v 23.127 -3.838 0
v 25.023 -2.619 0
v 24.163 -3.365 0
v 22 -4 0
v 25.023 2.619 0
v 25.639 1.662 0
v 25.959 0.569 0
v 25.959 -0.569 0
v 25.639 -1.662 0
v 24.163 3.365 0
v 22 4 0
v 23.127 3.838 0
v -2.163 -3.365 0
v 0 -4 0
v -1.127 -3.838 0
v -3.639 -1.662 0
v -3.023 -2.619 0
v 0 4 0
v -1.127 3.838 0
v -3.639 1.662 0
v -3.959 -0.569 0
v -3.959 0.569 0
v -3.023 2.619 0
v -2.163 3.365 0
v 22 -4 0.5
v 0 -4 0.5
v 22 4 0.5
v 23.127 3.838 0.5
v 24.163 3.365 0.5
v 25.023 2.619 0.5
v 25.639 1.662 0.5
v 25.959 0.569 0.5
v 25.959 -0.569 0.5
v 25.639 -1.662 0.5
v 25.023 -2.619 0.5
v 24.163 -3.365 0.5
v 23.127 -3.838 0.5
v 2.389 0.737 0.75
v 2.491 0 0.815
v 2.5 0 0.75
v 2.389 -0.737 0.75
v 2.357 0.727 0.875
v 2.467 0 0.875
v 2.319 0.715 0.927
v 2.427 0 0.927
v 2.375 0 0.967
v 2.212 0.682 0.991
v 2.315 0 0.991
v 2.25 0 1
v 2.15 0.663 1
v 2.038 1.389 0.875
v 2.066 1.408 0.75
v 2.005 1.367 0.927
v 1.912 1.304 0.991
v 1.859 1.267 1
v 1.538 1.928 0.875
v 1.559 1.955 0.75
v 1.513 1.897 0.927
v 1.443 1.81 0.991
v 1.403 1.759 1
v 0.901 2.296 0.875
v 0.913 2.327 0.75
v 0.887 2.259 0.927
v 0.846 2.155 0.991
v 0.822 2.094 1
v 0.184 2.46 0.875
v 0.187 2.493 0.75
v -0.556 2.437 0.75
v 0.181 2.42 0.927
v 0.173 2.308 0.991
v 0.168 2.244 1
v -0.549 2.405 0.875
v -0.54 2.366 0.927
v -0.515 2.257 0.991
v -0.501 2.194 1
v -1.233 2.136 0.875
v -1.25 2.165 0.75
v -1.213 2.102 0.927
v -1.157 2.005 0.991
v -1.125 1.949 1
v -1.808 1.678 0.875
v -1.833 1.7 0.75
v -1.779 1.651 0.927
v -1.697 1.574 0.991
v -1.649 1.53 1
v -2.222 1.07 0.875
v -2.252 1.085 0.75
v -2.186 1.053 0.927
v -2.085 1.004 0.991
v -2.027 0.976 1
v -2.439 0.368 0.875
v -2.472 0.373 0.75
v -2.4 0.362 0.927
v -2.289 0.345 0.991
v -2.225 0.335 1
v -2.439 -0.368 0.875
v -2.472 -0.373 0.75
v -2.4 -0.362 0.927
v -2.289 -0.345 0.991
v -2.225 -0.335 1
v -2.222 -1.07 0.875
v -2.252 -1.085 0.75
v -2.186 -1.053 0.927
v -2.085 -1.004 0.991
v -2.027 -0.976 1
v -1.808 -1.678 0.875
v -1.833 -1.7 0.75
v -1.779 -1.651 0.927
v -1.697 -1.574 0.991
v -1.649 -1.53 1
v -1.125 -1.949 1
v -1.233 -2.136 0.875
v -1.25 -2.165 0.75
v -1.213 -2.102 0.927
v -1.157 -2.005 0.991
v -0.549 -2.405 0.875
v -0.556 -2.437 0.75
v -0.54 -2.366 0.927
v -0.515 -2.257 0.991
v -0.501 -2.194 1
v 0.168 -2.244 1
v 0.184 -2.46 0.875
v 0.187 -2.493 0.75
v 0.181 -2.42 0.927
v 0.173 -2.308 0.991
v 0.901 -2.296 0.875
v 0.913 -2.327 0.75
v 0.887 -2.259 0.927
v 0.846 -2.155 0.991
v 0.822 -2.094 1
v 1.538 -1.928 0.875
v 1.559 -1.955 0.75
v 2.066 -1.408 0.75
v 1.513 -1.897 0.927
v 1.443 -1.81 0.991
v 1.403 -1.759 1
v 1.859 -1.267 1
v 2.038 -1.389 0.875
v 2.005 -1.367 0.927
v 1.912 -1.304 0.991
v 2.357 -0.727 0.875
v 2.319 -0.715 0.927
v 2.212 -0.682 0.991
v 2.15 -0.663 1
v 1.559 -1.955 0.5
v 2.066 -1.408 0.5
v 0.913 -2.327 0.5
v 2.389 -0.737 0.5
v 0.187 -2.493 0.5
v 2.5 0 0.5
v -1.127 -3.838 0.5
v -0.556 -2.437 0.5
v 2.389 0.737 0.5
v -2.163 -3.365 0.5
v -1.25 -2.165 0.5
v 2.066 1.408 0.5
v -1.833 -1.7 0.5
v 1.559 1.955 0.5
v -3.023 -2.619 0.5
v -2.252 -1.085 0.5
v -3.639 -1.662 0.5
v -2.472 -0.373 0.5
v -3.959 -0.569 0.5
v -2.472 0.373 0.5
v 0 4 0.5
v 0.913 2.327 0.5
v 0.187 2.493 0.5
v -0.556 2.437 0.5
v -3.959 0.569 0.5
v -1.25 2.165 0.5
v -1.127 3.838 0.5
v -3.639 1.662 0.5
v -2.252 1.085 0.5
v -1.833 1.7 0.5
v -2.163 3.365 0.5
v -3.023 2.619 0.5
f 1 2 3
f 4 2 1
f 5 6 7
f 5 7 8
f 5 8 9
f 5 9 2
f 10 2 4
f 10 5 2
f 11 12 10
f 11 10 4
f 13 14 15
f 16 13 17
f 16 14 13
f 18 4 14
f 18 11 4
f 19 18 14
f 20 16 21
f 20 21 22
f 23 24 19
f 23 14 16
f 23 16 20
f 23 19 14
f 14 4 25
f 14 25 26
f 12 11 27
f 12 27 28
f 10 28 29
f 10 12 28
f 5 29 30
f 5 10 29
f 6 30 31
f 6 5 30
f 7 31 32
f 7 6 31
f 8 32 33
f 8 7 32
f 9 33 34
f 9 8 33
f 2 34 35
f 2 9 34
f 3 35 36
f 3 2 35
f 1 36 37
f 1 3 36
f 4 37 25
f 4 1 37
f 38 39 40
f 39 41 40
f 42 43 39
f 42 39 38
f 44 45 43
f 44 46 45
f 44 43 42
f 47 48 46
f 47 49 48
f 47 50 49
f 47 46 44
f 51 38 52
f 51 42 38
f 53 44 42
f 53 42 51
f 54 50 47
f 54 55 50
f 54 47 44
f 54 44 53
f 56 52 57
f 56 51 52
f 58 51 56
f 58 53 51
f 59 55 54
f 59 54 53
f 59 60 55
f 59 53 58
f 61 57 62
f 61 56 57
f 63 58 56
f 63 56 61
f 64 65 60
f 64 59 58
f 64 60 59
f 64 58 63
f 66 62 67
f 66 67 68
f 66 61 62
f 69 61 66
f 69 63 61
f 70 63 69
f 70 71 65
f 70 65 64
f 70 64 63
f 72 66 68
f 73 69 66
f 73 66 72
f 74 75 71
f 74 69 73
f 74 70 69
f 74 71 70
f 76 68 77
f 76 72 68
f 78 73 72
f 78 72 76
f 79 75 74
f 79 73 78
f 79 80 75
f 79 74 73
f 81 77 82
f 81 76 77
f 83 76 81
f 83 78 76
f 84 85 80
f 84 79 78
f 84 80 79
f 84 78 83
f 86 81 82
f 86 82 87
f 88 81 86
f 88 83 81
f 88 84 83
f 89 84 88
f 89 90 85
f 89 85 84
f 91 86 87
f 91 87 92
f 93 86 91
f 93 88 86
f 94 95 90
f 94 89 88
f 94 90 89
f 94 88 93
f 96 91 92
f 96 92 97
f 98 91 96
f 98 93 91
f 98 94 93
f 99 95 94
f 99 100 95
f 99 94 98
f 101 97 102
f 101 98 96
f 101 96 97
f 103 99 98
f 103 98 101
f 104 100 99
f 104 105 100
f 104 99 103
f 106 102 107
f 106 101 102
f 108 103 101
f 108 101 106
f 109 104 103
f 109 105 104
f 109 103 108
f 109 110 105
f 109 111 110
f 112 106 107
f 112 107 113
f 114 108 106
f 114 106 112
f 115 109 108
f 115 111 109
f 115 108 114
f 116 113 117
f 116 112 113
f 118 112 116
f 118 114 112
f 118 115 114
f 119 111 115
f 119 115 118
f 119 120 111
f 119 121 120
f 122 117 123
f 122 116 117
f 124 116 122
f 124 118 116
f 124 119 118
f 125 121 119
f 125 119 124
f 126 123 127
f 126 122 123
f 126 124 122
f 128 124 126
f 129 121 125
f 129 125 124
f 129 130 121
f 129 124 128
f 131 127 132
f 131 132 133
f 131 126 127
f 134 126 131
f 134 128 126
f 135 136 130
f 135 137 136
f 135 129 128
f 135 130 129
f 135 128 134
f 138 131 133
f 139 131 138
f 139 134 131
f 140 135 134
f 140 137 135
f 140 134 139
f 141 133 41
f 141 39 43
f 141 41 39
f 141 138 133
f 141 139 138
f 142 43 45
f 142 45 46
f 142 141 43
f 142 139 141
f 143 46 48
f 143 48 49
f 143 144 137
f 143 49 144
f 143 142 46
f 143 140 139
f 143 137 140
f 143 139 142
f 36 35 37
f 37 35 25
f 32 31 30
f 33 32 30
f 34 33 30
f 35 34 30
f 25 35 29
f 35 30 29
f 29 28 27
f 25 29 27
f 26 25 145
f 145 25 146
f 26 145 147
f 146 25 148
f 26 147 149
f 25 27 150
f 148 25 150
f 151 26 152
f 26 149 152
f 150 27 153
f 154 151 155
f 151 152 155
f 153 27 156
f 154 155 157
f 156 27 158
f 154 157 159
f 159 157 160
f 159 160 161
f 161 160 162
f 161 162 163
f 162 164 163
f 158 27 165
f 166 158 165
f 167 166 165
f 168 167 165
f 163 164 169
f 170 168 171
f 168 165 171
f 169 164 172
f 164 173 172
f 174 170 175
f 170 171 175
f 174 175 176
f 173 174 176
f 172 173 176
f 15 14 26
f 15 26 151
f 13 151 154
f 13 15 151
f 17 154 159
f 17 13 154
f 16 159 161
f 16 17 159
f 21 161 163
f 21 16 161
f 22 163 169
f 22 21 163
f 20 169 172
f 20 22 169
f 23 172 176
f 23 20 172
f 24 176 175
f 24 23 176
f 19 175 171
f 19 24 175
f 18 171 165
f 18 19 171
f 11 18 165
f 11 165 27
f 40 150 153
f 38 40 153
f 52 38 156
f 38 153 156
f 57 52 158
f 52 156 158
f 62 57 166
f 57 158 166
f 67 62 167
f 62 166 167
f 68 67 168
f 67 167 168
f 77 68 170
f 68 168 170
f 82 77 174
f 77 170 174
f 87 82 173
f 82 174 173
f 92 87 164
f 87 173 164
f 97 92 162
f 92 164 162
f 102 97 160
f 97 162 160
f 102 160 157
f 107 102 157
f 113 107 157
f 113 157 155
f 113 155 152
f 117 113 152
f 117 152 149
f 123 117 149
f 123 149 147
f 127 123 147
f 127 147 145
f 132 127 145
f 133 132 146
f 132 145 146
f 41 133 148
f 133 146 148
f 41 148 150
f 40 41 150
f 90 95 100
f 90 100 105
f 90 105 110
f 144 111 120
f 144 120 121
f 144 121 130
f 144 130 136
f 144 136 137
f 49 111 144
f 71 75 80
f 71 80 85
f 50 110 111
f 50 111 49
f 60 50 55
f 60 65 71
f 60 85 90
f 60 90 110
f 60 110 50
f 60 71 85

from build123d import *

# Parameters (mm, degrees)
EXTRUDE_1_DEPTH = 0.5
SKETCH_2_R      = 2.5
EXTRUDE_2_DEPTH = 0.5
FILLET_1_R      = 0.25


with BuildPart() as part:
    # 草图1 → 凸台-拉伸1 (new body)
    with BuildSketch(Plane.XY):
        with BuildLine():
            Line((0, 4), (22, 4))
            ThreePointArc((22, 4), (26, 0), (22, -4))
            Line((22, -4), (0, -4))
            ThreePointArc((0, -4), (-4, 0), (0, 4))
        make_face()
    extrude(amount=EXTRUDE_1_DEPTH)

    # 草图2 → 凸台-拉伸2 (add)
    with BuildSketch(Plane.XY.offset(0.5)):
        Circle(SKETCH_2_R)
    extrude(amount=EXTRUDE_2_DEPTH)

    # 圆角1
    fillet_1_edges = [part.edges().sort_by_distance(p)[0] for p in [
        (-2.5, 0, 1),
    ]]
    fillet(fillet_1_edges, radius=FILLET_1_R)


solid = part.part
